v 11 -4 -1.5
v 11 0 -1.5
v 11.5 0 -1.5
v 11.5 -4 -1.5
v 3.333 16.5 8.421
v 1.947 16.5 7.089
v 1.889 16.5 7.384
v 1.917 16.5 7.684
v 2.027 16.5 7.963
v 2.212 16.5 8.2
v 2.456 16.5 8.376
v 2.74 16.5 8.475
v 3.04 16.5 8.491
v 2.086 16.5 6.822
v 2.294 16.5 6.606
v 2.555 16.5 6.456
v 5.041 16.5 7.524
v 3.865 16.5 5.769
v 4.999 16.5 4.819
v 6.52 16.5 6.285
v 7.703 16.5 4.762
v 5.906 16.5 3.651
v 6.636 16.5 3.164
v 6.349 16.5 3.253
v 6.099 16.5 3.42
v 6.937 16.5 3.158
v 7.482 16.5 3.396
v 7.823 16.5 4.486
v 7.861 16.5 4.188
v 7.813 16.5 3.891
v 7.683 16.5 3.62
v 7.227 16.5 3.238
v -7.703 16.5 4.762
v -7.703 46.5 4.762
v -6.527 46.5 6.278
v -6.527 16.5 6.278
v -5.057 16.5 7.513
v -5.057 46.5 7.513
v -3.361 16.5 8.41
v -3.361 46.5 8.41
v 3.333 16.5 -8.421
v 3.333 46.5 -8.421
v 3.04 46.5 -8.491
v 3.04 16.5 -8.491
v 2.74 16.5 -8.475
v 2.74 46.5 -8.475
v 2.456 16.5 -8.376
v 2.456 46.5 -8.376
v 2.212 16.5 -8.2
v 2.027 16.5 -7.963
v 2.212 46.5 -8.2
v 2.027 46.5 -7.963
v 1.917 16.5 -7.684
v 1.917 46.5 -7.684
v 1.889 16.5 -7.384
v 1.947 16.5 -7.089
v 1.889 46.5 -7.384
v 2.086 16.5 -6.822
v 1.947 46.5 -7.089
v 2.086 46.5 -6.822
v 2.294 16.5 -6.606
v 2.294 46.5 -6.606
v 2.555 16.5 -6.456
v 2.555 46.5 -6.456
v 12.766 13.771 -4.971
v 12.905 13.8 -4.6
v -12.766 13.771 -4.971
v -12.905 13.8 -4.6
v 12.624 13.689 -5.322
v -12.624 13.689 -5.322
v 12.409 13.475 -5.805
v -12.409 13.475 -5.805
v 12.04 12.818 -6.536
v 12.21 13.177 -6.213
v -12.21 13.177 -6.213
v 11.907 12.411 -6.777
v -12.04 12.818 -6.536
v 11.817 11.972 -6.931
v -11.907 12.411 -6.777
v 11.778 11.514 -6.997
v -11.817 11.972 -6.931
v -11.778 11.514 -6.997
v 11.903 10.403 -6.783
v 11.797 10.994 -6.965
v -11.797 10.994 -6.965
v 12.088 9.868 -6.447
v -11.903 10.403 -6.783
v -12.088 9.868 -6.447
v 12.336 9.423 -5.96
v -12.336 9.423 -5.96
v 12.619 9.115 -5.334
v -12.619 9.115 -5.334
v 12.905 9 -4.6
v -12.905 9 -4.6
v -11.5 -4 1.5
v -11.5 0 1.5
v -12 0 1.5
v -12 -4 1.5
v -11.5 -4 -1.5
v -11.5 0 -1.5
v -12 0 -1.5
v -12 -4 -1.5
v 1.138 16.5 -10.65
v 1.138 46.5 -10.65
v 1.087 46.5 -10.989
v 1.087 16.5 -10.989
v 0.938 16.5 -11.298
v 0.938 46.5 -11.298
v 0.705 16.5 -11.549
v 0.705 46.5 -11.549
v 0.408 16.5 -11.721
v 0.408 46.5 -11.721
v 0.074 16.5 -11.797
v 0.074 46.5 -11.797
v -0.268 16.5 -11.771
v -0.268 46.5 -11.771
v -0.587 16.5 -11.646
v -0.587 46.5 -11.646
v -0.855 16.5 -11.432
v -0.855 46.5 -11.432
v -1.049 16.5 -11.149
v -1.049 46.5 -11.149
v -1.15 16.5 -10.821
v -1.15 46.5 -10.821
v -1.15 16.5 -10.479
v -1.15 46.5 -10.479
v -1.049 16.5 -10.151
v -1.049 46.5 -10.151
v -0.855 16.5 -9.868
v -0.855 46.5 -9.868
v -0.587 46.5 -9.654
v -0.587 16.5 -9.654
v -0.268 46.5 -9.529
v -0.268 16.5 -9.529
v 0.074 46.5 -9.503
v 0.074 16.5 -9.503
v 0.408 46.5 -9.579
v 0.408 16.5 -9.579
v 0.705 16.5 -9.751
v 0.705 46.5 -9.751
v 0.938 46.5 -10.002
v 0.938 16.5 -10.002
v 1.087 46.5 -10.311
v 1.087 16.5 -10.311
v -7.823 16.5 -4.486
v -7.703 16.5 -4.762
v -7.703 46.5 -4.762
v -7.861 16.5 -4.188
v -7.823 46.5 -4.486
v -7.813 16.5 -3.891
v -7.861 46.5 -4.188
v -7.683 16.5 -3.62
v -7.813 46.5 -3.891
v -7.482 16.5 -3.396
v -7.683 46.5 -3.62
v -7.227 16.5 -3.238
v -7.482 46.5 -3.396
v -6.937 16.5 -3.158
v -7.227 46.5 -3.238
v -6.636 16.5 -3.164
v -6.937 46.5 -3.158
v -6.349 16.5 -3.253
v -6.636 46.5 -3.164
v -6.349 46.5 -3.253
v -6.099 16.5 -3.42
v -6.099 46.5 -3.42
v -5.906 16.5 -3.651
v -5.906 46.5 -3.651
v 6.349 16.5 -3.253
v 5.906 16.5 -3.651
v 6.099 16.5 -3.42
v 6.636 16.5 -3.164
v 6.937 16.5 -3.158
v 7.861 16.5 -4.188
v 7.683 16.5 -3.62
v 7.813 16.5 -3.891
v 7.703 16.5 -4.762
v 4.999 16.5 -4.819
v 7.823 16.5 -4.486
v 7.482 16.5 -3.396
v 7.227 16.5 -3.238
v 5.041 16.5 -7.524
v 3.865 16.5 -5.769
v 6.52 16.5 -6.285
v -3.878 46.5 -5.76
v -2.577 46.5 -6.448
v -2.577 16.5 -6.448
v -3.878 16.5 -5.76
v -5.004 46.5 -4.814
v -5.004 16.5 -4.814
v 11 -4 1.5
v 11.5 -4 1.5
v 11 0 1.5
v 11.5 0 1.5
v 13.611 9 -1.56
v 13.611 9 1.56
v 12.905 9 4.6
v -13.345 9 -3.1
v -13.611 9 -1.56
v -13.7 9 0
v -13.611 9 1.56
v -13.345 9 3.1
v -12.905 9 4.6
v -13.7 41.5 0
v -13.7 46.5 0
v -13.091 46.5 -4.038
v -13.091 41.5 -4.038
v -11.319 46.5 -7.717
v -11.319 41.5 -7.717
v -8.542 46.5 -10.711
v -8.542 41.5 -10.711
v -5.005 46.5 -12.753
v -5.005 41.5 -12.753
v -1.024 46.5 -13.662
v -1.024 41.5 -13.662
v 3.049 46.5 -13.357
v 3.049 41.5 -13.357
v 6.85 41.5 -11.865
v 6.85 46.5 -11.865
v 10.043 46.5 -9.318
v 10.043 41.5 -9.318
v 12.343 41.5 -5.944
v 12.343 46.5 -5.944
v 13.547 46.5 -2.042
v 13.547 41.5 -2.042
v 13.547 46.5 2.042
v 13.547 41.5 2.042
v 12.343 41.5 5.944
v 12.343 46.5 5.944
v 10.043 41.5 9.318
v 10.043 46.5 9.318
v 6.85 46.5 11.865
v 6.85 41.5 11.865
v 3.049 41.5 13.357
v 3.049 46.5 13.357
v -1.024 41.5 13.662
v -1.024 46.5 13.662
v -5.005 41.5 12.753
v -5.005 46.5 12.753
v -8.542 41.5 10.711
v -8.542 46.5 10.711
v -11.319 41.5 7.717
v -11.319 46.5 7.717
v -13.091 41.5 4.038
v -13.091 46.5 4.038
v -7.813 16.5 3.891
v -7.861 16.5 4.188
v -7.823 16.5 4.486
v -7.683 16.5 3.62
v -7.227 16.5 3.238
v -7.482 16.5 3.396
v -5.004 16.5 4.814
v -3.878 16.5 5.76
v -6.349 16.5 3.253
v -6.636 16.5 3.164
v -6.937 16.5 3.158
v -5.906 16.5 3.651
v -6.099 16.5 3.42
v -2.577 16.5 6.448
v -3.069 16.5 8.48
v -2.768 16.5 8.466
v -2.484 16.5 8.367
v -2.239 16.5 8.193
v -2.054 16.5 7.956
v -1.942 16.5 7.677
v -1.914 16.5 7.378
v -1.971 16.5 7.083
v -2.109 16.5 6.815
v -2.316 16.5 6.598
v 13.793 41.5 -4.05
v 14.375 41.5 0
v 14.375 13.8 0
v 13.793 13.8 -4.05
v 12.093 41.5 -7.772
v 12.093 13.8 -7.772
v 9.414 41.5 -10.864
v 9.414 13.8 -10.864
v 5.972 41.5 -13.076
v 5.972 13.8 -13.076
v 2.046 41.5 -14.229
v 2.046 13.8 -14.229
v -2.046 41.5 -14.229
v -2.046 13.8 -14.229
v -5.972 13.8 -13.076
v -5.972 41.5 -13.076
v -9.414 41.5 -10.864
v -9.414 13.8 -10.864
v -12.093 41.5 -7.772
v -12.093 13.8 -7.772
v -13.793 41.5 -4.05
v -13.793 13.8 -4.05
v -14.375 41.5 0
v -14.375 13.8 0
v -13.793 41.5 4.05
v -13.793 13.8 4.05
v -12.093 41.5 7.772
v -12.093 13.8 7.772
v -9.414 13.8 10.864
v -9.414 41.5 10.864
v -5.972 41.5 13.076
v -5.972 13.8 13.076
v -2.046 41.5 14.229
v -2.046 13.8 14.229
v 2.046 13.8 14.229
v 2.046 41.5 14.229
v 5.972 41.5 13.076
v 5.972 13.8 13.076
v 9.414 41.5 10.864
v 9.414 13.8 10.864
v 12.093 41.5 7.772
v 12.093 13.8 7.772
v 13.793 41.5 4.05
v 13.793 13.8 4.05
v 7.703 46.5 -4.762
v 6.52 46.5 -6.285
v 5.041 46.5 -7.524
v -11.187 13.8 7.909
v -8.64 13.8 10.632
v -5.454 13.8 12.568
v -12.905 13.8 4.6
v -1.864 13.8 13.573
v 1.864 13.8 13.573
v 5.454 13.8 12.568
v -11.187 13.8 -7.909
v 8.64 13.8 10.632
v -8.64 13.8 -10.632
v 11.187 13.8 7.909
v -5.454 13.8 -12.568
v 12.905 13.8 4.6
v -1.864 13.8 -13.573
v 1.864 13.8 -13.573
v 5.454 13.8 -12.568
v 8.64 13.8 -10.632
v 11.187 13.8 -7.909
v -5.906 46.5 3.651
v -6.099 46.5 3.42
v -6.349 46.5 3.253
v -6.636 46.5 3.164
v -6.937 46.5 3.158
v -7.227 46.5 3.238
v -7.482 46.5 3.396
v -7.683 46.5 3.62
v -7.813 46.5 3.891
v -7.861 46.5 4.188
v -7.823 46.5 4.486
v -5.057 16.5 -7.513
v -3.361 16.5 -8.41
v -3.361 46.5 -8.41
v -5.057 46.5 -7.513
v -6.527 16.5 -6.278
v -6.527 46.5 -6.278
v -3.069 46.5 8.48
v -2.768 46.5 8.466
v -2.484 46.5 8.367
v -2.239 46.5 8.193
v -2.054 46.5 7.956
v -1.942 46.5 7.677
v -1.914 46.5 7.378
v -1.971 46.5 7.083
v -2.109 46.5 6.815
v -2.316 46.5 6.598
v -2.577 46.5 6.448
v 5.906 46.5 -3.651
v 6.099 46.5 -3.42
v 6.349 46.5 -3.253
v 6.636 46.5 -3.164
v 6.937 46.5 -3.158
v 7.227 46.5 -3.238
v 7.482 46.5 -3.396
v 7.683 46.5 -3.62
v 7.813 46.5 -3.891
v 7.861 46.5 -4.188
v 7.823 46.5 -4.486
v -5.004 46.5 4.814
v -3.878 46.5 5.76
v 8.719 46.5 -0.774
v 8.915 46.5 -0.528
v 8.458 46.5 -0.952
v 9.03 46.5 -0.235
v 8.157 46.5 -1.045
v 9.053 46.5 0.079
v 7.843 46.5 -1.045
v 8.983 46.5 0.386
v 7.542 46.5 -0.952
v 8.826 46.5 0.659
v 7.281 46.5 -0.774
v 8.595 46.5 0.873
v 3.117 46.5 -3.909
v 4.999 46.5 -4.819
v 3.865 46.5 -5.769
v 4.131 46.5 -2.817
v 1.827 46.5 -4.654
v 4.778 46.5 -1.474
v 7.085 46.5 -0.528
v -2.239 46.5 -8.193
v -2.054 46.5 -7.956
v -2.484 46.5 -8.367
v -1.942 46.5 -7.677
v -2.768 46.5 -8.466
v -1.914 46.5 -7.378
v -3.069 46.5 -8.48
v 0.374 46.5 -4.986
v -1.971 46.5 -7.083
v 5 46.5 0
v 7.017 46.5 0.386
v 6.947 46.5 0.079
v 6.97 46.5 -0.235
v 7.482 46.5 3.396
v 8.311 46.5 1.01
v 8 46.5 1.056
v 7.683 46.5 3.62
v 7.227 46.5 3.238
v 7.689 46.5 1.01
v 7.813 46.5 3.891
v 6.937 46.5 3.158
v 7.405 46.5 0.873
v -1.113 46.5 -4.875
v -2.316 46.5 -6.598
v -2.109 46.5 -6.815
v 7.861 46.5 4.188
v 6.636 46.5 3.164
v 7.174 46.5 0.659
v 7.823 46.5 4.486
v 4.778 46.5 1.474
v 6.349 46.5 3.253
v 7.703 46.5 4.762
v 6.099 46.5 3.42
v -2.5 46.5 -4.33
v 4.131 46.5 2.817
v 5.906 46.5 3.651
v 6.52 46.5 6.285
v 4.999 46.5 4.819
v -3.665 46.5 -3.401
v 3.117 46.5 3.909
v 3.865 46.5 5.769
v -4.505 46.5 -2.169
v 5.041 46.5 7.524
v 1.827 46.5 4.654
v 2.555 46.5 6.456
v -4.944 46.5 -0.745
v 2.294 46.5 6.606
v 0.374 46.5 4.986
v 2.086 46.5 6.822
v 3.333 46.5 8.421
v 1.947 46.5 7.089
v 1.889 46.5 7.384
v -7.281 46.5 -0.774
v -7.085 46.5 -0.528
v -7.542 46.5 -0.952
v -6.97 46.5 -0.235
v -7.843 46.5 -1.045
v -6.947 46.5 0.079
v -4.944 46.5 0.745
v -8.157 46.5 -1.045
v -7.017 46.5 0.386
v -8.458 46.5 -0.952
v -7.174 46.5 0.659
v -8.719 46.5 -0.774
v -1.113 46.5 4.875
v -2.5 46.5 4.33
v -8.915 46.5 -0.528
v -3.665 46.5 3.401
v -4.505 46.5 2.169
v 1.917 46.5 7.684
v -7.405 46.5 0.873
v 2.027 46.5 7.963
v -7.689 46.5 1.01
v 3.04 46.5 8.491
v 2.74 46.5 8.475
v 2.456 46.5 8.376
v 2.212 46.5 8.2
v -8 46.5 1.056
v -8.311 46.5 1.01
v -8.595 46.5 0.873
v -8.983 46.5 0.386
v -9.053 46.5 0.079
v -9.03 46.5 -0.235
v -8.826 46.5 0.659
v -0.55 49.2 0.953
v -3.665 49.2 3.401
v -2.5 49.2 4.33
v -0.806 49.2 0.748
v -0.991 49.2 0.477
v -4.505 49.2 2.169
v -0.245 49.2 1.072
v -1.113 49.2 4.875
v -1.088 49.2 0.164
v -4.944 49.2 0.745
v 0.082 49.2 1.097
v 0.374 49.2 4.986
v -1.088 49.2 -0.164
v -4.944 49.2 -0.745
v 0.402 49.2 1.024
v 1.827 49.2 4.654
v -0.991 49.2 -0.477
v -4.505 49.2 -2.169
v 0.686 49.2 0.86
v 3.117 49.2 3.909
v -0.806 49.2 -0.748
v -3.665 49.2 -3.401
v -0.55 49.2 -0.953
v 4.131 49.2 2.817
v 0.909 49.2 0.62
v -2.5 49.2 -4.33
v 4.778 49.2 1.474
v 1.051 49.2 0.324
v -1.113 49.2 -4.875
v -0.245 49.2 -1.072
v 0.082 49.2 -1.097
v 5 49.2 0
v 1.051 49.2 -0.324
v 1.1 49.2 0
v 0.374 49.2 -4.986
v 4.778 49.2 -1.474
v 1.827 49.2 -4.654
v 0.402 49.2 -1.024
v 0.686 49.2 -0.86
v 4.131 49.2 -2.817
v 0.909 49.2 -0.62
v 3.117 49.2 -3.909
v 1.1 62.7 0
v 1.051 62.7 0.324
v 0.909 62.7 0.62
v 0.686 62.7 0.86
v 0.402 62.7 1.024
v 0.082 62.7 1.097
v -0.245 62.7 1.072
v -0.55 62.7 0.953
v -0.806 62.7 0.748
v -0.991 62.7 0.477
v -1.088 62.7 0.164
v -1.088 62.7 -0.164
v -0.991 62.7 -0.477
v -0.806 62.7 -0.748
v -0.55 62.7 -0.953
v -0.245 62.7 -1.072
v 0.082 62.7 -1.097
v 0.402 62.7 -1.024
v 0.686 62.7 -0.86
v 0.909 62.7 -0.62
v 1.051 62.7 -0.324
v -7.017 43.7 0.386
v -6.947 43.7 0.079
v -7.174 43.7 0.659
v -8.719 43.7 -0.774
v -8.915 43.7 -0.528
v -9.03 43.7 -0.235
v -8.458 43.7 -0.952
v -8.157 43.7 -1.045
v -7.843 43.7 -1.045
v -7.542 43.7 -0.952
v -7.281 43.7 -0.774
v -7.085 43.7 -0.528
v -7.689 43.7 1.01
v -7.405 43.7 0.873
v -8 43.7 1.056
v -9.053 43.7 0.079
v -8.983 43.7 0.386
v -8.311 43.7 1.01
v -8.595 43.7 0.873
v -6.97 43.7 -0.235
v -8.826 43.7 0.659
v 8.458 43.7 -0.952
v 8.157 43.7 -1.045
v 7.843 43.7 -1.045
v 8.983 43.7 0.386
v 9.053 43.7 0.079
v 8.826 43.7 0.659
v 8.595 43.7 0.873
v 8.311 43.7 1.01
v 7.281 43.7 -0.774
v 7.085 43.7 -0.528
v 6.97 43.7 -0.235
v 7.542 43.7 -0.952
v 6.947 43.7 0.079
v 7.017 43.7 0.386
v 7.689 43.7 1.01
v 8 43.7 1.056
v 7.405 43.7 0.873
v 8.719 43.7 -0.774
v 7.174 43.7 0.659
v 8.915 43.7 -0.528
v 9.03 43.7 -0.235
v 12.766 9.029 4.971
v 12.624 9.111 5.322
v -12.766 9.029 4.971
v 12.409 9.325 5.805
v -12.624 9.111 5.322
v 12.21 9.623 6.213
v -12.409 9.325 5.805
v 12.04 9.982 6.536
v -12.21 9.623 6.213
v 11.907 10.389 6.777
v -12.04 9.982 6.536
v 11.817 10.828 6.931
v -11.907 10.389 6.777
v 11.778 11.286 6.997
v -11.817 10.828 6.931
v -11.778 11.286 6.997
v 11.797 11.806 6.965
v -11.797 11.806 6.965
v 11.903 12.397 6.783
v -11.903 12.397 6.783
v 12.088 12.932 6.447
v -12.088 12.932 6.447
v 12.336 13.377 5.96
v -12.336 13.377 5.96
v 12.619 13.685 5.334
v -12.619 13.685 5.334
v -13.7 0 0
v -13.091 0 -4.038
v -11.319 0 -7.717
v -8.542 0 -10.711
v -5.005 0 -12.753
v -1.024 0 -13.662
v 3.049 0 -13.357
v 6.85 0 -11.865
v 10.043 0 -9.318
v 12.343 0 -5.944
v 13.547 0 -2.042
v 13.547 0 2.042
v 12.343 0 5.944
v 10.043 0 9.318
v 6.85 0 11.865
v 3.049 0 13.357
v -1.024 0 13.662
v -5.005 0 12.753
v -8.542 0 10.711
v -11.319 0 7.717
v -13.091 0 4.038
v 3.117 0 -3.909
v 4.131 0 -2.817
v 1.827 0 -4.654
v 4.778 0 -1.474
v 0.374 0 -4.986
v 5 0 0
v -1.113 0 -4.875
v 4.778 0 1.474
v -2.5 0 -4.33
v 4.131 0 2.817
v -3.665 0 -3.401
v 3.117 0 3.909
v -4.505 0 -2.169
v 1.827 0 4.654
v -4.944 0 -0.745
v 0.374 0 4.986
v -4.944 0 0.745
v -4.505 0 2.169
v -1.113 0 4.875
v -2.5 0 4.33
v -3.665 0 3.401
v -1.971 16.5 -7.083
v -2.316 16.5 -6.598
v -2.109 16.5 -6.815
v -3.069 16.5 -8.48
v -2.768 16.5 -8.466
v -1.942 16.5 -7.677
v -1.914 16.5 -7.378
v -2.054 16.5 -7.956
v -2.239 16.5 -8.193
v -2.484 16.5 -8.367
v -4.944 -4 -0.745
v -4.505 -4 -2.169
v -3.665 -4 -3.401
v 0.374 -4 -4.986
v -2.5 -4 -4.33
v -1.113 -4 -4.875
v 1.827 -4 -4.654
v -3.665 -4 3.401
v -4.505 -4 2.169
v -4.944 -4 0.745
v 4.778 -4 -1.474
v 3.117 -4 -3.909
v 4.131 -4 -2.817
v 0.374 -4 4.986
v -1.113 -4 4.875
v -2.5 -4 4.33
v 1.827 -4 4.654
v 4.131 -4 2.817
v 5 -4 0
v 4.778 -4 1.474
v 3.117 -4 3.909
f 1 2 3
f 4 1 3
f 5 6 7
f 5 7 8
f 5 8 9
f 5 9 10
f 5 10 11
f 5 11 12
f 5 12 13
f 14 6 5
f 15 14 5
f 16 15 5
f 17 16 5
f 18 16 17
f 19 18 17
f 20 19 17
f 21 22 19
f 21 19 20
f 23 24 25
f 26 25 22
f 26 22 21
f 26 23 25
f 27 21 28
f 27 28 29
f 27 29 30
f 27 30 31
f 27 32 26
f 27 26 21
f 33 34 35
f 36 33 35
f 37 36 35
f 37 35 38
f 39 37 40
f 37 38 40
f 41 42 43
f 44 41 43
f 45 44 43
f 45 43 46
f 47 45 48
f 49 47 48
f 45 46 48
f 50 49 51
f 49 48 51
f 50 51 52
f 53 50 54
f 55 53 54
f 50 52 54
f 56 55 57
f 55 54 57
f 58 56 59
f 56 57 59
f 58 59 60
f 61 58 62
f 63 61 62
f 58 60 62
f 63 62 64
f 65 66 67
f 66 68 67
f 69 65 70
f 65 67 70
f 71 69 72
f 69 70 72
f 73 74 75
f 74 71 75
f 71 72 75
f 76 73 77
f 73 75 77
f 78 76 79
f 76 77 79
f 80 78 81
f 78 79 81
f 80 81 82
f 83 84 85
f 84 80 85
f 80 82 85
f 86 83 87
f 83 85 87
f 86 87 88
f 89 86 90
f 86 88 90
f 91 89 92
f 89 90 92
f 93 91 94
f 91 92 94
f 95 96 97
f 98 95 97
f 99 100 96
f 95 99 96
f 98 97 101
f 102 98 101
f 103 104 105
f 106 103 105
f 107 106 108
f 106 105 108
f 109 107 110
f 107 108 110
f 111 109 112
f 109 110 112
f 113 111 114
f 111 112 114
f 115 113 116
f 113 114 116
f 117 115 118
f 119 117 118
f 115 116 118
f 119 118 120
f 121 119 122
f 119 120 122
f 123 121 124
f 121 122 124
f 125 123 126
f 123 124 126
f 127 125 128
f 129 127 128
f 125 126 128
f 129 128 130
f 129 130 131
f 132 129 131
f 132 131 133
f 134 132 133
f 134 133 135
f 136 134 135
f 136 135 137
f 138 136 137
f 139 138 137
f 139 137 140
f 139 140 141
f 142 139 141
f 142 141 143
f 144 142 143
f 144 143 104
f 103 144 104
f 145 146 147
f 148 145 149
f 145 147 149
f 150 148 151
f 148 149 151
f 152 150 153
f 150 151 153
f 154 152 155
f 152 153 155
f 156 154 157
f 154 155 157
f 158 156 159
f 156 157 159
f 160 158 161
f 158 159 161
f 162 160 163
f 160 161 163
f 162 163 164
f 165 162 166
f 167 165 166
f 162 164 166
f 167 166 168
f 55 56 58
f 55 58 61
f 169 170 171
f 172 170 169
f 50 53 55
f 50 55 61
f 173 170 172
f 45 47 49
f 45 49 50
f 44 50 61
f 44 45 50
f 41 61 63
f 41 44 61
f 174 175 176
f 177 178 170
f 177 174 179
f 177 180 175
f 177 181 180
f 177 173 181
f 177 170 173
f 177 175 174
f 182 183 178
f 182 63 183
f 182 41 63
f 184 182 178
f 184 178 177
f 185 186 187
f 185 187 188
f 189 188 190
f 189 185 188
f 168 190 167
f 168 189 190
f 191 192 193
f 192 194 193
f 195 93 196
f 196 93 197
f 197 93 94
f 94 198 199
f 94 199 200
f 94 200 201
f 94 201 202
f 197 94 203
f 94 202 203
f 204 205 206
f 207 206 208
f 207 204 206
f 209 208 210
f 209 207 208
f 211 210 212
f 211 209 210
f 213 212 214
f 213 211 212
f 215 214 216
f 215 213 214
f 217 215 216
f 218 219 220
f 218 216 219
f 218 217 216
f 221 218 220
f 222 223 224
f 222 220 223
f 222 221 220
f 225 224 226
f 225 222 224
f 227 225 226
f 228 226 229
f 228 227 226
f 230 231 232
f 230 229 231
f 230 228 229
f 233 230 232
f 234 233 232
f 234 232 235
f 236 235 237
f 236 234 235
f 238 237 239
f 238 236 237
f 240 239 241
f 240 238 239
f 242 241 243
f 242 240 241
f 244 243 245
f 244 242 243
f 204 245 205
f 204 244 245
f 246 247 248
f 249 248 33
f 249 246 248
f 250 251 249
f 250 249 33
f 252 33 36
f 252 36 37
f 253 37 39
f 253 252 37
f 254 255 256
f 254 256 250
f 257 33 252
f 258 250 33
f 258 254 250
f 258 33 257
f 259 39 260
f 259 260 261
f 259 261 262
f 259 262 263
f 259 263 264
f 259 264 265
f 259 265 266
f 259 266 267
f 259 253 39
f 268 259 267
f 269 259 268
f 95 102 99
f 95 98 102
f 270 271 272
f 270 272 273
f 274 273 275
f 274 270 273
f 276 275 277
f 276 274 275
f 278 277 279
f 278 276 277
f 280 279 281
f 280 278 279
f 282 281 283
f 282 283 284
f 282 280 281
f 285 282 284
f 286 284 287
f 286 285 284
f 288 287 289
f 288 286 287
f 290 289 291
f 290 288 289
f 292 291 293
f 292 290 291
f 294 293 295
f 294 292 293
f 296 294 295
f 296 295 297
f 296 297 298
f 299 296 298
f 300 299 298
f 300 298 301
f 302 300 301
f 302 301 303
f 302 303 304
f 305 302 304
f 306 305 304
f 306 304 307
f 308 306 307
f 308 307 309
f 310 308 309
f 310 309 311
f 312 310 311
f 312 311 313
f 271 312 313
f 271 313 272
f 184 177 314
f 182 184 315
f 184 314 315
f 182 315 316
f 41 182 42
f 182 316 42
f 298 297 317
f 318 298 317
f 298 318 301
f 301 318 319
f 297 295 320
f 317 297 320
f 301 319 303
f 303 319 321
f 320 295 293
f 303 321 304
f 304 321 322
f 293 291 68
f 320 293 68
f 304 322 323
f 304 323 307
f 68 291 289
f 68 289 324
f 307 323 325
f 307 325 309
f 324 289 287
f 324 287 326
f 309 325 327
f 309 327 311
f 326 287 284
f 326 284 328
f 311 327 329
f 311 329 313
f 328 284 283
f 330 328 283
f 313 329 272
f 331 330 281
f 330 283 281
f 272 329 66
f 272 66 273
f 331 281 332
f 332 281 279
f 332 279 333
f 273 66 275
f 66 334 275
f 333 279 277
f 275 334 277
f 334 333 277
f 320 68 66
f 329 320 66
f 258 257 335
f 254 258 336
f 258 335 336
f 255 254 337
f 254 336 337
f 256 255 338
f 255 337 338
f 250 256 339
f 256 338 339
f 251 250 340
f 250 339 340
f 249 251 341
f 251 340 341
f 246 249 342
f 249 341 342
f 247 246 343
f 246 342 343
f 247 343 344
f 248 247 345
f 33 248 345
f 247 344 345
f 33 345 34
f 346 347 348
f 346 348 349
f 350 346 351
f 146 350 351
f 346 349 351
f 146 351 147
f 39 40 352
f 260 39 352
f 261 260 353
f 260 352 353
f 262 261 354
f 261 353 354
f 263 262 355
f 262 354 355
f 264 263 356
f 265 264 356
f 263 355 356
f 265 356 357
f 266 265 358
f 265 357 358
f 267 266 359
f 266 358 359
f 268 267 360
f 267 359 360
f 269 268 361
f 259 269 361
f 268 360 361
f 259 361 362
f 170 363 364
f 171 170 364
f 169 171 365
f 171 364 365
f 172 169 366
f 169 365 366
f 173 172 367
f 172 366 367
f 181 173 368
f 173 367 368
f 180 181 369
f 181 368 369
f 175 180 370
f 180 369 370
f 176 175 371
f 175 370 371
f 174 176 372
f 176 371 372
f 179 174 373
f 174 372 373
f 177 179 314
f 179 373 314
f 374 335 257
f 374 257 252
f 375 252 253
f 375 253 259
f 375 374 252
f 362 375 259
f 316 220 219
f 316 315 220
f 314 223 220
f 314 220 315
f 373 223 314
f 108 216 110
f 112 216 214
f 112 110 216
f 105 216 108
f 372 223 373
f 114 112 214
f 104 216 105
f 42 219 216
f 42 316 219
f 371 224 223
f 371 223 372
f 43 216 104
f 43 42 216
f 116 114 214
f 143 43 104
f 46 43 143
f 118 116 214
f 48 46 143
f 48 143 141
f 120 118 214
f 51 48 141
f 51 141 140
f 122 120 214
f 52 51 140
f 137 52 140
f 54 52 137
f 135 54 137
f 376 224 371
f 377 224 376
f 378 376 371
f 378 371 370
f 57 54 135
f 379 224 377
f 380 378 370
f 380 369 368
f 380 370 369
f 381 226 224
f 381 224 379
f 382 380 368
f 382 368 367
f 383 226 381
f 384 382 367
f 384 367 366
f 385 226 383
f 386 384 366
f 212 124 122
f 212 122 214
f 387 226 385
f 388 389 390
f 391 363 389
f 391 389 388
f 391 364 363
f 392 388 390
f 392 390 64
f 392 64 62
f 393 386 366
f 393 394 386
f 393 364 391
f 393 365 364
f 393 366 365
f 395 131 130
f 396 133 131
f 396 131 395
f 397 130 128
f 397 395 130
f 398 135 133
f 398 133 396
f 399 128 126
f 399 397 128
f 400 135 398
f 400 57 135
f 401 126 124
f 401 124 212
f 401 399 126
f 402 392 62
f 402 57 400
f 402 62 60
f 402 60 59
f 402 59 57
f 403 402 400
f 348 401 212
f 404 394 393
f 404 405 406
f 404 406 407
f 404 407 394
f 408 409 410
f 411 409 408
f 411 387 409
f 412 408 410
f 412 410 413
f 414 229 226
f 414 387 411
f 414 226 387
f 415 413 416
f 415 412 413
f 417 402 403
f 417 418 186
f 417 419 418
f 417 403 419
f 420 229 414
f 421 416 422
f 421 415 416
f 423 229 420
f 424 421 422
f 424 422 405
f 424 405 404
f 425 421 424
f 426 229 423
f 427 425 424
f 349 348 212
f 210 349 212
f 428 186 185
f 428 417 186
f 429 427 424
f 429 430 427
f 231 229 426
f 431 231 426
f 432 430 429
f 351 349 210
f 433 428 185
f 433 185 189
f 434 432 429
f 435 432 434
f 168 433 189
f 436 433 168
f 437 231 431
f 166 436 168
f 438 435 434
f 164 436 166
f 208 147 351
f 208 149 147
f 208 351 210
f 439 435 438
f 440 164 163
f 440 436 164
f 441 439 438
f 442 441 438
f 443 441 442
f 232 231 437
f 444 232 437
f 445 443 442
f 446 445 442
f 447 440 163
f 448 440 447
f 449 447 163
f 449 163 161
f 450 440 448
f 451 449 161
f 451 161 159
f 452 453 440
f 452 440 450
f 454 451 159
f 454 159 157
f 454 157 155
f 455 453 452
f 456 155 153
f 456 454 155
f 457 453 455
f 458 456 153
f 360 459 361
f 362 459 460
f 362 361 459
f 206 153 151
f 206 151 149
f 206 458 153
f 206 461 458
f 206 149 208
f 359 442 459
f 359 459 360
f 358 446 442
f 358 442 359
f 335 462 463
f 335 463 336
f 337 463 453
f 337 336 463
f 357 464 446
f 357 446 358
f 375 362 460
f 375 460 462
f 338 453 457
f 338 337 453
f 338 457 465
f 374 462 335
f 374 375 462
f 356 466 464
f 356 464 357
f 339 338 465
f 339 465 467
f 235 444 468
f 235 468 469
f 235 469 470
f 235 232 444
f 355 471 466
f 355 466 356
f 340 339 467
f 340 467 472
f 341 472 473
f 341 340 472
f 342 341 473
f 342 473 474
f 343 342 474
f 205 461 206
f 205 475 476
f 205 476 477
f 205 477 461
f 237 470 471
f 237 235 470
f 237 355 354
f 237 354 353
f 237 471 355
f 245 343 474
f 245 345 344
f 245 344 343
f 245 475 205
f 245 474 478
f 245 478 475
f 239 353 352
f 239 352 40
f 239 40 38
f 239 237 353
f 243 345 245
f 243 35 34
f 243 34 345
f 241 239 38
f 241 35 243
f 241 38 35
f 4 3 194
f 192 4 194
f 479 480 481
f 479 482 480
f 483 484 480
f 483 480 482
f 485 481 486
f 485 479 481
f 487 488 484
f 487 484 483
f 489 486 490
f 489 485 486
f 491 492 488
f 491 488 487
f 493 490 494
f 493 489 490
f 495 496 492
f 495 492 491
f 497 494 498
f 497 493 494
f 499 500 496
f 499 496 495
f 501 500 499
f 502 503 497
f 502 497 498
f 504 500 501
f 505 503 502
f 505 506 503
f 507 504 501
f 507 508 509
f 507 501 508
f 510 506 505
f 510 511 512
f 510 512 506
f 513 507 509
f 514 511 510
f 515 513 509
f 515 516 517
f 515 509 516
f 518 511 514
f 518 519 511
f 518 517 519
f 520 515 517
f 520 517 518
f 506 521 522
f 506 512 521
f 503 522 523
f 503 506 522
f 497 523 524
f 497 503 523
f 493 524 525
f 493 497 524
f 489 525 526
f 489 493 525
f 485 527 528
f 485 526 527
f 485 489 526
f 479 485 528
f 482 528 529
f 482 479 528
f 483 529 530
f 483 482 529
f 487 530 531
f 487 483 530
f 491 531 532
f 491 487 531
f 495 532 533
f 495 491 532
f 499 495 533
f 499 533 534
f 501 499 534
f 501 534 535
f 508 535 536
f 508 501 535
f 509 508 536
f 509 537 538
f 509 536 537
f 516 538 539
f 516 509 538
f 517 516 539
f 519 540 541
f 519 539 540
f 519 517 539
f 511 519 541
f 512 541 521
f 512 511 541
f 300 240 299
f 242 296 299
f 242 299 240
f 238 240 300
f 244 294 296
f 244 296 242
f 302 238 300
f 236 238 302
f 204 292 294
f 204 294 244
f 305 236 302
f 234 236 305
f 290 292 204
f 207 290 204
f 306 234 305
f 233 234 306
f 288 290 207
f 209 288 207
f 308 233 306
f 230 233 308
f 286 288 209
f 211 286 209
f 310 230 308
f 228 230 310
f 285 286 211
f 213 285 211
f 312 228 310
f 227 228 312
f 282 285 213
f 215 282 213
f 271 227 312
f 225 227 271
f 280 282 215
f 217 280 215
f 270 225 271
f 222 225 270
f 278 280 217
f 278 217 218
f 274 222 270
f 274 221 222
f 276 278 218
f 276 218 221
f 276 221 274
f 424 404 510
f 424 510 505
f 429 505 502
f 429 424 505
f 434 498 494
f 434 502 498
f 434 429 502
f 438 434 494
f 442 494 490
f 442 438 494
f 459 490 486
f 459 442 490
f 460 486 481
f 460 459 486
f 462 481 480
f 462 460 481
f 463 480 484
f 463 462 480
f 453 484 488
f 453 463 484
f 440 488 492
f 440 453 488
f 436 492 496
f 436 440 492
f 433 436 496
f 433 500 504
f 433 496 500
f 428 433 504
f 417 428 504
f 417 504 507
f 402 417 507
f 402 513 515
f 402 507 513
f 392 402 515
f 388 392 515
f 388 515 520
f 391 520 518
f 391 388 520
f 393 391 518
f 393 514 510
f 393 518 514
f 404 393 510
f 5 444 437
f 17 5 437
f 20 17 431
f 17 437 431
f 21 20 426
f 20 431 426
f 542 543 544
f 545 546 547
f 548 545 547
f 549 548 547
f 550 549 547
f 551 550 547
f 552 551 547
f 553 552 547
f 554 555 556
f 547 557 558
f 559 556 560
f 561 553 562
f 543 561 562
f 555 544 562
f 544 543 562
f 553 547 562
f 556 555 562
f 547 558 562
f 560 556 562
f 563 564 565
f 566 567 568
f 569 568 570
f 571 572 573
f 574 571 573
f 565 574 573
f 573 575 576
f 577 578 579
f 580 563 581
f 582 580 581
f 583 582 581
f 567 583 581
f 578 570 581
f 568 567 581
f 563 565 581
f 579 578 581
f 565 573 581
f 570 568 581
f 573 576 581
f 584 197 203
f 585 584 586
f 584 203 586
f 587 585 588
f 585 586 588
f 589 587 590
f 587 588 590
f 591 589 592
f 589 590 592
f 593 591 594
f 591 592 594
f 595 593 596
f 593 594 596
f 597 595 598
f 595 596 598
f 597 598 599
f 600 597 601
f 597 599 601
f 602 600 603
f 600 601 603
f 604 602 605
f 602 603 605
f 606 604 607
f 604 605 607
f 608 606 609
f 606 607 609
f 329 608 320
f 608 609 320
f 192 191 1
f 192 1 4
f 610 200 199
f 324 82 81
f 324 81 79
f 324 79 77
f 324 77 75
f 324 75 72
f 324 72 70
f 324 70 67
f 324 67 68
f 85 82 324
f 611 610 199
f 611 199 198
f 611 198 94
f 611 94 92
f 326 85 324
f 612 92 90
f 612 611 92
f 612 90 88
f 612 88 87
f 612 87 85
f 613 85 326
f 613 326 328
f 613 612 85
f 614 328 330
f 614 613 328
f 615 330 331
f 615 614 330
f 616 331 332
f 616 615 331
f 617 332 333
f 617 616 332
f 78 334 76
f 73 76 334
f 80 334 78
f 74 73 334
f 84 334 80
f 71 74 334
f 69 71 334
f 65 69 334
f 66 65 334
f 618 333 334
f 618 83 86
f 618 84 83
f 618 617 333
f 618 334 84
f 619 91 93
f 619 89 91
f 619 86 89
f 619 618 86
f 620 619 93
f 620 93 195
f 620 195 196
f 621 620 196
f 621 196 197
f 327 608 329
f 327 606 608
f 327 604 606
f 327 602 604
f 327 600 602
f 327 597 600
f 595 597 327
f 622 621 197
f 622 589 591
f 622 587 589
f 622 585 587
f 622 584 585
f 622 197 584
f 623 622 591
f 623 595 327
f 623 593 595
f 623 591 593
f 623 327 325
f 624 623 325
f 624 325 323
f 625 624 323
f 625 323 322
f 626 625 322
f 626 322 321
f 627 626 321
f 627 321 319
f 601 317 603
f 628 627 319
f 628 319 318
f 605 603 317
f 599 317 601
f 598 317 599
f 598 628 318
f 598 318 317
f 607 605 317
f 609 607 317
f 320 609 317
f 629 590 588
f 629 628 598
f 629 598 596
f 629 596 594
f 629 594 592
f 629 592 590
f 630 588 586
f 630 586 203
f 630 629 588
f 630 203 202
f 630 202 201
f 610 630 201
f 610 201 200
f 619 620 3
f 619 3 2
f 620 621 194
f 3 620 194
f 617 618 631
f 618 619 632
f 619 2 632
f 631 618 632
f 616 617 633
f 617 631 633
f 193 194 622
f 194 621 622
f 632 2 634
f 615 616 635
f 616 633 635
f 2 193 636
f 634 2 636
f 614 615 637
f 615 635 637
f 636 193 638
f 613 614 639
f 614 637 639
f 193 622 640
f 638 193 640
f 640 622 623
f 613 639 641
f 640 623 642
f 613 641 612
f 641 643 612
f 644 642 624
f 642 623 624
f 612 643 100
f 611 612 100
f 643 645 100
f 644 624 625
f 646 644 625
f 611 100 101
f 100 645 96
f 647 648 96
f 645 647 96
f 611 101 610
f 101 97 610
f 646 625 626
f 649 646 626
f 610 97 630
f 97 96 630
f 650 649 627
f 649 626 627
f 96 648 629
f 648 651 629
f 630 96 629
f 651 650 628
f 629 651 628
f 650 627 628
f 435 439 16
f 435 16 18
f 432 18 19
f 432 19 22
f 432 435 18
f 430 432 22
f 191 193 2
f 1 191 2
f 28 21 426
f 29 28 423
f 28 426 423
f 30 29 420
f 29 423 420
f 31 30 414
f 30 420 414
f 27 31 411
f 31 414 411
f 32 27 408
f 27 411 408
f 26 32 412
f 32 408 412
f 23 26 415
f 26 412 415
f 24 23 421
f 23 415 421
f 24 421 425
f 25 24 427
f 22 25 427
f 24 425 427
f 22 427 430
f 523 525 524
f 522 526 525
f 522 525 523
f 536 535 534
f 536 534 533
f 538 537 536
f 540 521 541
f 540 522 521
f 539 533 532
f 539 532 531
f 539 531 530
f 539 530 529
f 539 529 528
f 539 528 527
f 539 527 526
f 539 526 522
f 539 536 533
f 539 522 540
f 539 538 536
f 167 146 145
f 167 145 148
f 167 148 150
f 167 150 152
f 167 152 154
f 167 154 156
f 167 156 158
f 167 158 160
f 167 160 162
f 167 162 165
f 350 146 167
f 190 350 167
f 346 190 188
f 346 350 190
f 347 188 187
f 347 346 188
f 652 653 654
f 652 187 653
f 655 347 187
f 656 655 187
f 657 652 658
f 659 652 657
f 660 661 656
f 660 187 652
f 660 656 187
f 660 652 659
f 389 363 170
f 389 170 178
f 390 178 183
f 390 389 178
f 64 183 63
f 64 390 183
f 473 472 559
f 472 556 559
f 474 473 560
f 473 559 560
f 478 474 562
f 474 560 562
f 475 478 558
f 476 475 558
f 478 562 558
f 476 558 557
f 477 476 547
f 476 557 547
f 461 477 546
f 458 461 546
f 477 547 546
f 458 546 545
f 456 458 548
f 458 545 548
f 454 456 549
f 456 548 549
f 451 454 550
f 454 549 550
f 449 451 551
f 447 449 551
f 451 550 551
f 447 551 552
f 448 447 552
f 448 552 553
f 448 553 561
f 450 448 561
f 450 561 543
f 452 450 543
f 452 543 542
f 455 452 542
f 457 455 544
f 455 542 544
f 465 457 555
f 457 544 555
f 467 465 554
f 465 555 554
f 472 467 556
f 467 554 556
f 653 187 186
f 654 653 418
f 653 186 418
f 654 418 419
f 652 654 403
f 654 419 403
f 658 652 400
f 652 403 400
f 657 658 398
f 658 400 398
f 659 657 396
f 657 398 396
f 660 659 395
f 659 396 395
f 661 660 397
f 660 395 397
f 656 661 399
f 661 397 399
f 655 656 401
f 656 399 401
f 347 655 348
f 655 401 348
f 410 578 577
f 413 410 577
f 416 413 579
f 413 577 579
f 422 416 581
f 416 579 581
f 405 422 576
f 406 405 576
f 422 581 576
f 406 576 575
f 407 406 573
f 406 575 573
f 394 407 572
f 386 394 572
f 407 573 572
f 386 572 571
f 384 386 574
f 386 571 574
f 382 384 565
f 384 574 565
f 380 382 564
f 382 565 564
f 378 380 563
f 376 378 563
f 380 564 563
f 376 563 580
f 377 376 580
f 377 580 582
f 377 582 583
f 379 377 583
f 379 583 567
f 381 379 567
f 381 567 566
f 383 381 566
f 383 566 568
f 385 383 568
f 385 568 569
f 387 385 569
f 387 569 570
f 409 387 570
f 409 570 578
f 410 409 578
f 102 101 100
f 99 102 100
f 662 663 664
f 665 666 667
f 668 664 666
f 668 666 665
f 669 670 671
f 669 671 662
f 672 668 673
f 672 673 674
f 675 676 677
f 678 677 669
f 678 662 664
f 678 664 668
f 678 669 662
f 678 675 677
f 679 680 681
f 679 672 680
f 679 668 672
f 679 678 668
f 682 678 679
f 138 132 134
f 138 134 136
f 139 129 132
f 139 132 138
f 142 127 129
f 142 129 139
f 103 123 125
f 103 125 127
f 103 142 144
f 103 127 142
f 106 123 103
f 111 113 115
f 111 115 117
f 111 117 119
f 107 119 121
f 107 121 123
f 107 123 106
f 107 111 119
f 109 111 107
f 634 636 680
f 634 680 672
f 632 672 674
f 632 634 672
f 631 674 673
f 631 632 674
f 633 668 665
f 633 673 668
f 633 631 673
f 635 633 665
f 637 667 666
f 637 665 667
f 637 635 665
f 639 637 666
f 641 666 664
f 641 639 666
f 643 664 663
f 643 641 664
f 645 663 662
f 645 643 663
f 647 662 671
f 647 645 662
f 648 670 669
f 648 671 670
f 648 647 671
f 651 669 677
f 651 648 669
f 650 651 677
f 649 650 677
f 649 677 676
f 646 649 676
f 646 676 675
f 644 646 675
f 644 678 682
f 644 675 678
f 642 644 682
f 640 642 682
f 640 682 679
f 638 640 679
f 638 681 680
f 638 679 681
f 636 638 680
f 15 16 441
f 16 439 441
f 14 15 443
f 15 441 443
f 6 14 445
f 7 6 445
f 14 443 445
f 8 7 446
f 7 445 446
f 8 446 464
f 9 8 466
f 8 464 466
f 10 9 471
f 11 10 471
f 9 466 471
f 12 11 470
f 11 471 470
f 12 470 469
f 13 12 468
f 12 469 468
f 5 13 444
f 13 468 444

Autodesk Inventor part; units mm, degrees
ref_plane "YZ Plane" through (0, 0, 0) normal (1, 0, 0) x (0, 1, 0)
sketch "Sketch1" plane through (0, 0, 0) normal (0, 1, 0) x (-1, 0, 0)
  circle A0 centre (0, 0) radius 13.7
  dimension "d0" = 27.4
extrude "Extrusion1" add sketch "Sketch1" along normal blind 46.5
sketch "Sketch2" plane through (0, 46.5, 0) normal (0, 1, 0) x (1, 0, 0)
  circle A0 centre (0, 0) radius 13.7 projected
  circle A1 centre (0, 0) radius 5
  dimension "d3" = 10
extrude "Extrusion2" add sketch "Sketch2" along normal blind 2.7 contours A1
sketch "Sketch3" plane through (0, 46.5, 0) normal (0, 1, 0) x (1, 0, 0)
  circle A0 centre (0, 0) radius 5 projected
  circle A1 centre (0, 0) radius 5 projected
  circle A2 centre (0, 0) radius 13.7 projected
  circle A3 centre (0, 0) radius 13.7 projected
  line L0 (-13.7, 0) -> (13.7, 0)
  point P0 (-8, 0)
  point P1 (8, 0)
  dimension "d6" = 16
  dimension "d7" = 5.7
  dimension "d8" = 5.7
hole "Hole1" at (-8, 46.5, 0) at (8, 46.5, 0) direction (0, -1, 0) diameter 2.1129 depth 2.8 thread size "M2.6x0.45" class "6H" standard "ISO Metric profile"
ref_plane "Work Plane1" through (0, 41.5, 0) normal (0, 1, 0) x (1, 0, 0)
sketch "Sketch4" plane through (0, 41.5, 0) normal (0, 1, 0) x (1, 0, 0)
  circle A0 centre (0, 0) radius 14.375
  dimension "d17" = 28.75
extrude "Extrusion3" add sketch "Sketch4" against normal blind 27.7
sketch "Sketch5" plane through (0, 0, 0) normal (0, -1, 0) x (1, 0, 0)
  circle A0 centre (0, 0) radius 5
  dimension "d20" = 10
extrude "Extrusion4" add sketch "Sketch5" along normal blind 4
sketch "Sketch6" plane through (0, 0, 0) normal (0, -1, 0) x (1, 0, 0)
  circle A0 centre (0, 0) radius 5 projected
  circle A1 centre (0, 0) radius 5 projected
  circle A2 centre (0, 0) radius 13.7 projected
  circle A3 centre (0, 0) radius 13.7 projected
  line L0 (13.7, 0) -> (-13.7, 0)
  line L1 (-11.5, 1.5) -> (-12, 1.5)
  line L2 (-12, 1.5) -> (-12, -1.5)
  line L3 (-12, -1.5) -> (-11.5, -1.5)
  line L4 (-11.5, -1.5) -> (-11.5, 1.5)
  line L5 (11.5, 1.5) -> (11, 1.5)
  line L6 (11, 1.5) -> (11, -1.5)
  line L7 (11, -1.5) -> (11.5, -1.5)
  line L8 (11.5, -1.5) -> (11.5, 1.5)
  dimension "d23" = 22.5
  dimension "d24" = 0.5
  dimension "d25" = 0.5
  dimension "d26" = 11.5
  dimension "d27" = 11.5
  dimension "d28" = 3
  dimension "d29" = 3
  dimension "d30" = 1.5
  dimension "d31" = 1.5
extrude "Extrusion5" add sketch "Sketch6" along normal up to surface (4 mm away) contours L6 L5 L8 L0 | L0 L8 L7 L6 | L4 L3 L2 L0 | L0 L2 L1 L4
sketch "Sketch7" plane through (0, 49.2, 0) normal (0, 1, 0) x (1, 0, 0)
  circle A0 centre (0, 0) radius 1.1
  dimension "d34" = 2.2
extrude "Extrusion6" add sketch "Sketch7" along normal blind 13.5
ref_plane "Work Plane2" through (0, 50.2, 0) normal (0, 1, 0) x (1, 0, 0)
sketch "Sketch10" plane through (0, 0, 0) normal (1, 0, 0) x (0, 1, 0)
  line L0 (0, -13.7) -> (0, 13.7) projected
  line L1 (13.8, 13.7) -> (13.8, -13.7) projected
  line L2 (9, 4.6) -> (13.8, 4.6)
  line L3 (13.8, 4.6) -> (13.8, -4.6)
  line L4 (13.8, -4.6) -> (9, -4.6)
  line L5 (9, -4.6) -> (9, 4.6)
  circle A0 centre (11.4, 4.6) radius 2.4
  circle A1 centre (11.4, -4.6) radius 2.4
  line L6 (0, 0) -> (13.8, 0)
  line L7 (13.8, 13.7) -> (13.8, -13.7) projected
  line L8 (0, -13.7) -> (13.8, -13.7) projected
  point P0 (11.4, 7)
  point P1 (11.4, -7)
  point P2 (13.8, -4.6)
  dimension "d57" = 9
  dimension "d59" = 0
  dimension "d60" = 4.8
  dimension "d61" = 13.8
  dimension "d62" = 2.4
  dimension "d63" = 2.4
  dimension "d64" = 14
  dimension "d65" = 4.6
  dimension "d66" = 4.6
  dimension "d69" = 6.7
extrude "Extrusion9" cut sketch "Sketch10" along normal mid plane 31.5 contours L6 L1 A1 L5 | L5 A0 L1 L6 | A1 L4 | L4 A1 | A0 L2 | L2 A0
sketch "Sketch11" plane through (0, 46.5, 0) normal (0, 1, 0) x (1, 0, 0)
  circle A0 centre (-8, 0) radius 1.0564 projected
  circle A1 centre (8, 0) radius 1.0564 projected
  circle A2 centre (0, 0) radius 5 projected
  circle A3 centre (0, 0) radius 13.7 projected
  circle A4 centre (8, 0) radius 1.0564 projected
  circle A5 centre (0, 0) radius 13.7 projected
  line L0 (13.7, 0) -> (-13.7, 0)
  circle A6 centre (0, 0) radius 1.1 projected
  circle A7 centre (0, 0) radius 9.0564
  circle A8 centre (0, 0) radius 6.9436
  circle A9 centre (8, 0) radius 1.0564 projected
  line L1 (1.8876, -9.0564) -> (-1.9124, -9.0564)
  line L2 (-1.9124, -9.0564) -> (-1.9124, 9.0564)
  line L3 (-1.9124, 9.0564) -> (1.8876, 9.0564)
  line L4 (1.8876, 9.0564) -> (1.8876, -9.0564)
  line L5 (-0.0124, -13.7) -> (-0.0124, 13.7)
  line L6 (9.0564, -3.15) -> (-9.0564, -3.15)
  line L7 (-9.0564, -3.15) -> (-9.0564, 3.15)
  line L8 (-9.0564, 3.15) -> (9.0564, 3.15)
  line L9 (9.0564, 3.15) -> (9.0564, -3.15)
  circle A10 centre (6.8048, -4.2064) radius 1.0564
  circle A11 centre (2.9441, -7.4386) radius 1.0564
  circle A12 centre (-2.9688, -7.4287) radius 1.0564
  circle A13 centre (-6.8048, -4.2064) radius 1.0564
  circle A14 centre (-6.8048, 4.2064) radius 1.0564
  line L10 (-11.7767, 7) -> (11.7767, 7) projected
  circle A15 centre (-2.9688, 7.4287) radius 1.0564
  circle A16 centre (2.9441, 7.4386) radius 1.0564
  circle A17 centre (6.8048, 4.2064) radius 1.0564
  circle A18 centre (-0.0124, 10.65) radius 1.15
  point P0 (9.0564, 0)
  point P1 (7.8048, -3.2064)
  point P2 (3.3328, 8.4209)
  point P3 (2.5553, 6.4563)
  point P4 (5.9062, 3.651)
  point P5 (7.7035, 4.7619)
  point P6 (-5.9062, 3.651)
  point P7 (-2.5768, 6.4477)
  point P8 (-3.3608, 8.4097)
  point P9 (-7.7035, 4.7619)
  point P10 (-3.3608, -8.4097)
  point P11 (-2.5768, -6.4477)
  point P12 (-5.9062, -3.651)
  point P13 (-7.7035, -4.7619)
  point P14 (7.7035, -4.7619)
  point P15 (5.9062, -3.651)
  point P16 (2.5553, -6.4563)
  point P17 (3.3328, -8.4209)
  point P18 (-0.0124, 11.8)
  dimension "d78" = 2.3
  dimension "d70" = 3.8
  dimension "d71" = 1.9
  dimension "d72" = 1.9
  dimension "d73" = 6.3
  dimension "d74" = 3.15
  dimension "d75" = 3.15
  dimension "d79" = 1.9
extrude "Extrusion10" cut sketch "Sketch11" against normal blind 30 contours A14 A7 L10 A15 A8 | A14 | A8 A12 A7 A13 | A13 | A15 L10 | A12 | A7 A15 L10 | A15 L10 | A18 L5 | L5 A18 | L10 A16 A7 | A7 A17 A8 A16 L10 | A11 A8 A10 A7 | A11 | A17 | A16 L10 | A16 L10 | A10
equation "\"d7\" = d8"
equation "\"d26\" = d27"
equation "\"d30\" = d31"
equation "\"d65\" = d66"
equation "\"d71\" = d72"
equation "\"d74\" = d75"
equation "\"d41\" = d42"
properties part number "rs390" material "Steel, Mild"
